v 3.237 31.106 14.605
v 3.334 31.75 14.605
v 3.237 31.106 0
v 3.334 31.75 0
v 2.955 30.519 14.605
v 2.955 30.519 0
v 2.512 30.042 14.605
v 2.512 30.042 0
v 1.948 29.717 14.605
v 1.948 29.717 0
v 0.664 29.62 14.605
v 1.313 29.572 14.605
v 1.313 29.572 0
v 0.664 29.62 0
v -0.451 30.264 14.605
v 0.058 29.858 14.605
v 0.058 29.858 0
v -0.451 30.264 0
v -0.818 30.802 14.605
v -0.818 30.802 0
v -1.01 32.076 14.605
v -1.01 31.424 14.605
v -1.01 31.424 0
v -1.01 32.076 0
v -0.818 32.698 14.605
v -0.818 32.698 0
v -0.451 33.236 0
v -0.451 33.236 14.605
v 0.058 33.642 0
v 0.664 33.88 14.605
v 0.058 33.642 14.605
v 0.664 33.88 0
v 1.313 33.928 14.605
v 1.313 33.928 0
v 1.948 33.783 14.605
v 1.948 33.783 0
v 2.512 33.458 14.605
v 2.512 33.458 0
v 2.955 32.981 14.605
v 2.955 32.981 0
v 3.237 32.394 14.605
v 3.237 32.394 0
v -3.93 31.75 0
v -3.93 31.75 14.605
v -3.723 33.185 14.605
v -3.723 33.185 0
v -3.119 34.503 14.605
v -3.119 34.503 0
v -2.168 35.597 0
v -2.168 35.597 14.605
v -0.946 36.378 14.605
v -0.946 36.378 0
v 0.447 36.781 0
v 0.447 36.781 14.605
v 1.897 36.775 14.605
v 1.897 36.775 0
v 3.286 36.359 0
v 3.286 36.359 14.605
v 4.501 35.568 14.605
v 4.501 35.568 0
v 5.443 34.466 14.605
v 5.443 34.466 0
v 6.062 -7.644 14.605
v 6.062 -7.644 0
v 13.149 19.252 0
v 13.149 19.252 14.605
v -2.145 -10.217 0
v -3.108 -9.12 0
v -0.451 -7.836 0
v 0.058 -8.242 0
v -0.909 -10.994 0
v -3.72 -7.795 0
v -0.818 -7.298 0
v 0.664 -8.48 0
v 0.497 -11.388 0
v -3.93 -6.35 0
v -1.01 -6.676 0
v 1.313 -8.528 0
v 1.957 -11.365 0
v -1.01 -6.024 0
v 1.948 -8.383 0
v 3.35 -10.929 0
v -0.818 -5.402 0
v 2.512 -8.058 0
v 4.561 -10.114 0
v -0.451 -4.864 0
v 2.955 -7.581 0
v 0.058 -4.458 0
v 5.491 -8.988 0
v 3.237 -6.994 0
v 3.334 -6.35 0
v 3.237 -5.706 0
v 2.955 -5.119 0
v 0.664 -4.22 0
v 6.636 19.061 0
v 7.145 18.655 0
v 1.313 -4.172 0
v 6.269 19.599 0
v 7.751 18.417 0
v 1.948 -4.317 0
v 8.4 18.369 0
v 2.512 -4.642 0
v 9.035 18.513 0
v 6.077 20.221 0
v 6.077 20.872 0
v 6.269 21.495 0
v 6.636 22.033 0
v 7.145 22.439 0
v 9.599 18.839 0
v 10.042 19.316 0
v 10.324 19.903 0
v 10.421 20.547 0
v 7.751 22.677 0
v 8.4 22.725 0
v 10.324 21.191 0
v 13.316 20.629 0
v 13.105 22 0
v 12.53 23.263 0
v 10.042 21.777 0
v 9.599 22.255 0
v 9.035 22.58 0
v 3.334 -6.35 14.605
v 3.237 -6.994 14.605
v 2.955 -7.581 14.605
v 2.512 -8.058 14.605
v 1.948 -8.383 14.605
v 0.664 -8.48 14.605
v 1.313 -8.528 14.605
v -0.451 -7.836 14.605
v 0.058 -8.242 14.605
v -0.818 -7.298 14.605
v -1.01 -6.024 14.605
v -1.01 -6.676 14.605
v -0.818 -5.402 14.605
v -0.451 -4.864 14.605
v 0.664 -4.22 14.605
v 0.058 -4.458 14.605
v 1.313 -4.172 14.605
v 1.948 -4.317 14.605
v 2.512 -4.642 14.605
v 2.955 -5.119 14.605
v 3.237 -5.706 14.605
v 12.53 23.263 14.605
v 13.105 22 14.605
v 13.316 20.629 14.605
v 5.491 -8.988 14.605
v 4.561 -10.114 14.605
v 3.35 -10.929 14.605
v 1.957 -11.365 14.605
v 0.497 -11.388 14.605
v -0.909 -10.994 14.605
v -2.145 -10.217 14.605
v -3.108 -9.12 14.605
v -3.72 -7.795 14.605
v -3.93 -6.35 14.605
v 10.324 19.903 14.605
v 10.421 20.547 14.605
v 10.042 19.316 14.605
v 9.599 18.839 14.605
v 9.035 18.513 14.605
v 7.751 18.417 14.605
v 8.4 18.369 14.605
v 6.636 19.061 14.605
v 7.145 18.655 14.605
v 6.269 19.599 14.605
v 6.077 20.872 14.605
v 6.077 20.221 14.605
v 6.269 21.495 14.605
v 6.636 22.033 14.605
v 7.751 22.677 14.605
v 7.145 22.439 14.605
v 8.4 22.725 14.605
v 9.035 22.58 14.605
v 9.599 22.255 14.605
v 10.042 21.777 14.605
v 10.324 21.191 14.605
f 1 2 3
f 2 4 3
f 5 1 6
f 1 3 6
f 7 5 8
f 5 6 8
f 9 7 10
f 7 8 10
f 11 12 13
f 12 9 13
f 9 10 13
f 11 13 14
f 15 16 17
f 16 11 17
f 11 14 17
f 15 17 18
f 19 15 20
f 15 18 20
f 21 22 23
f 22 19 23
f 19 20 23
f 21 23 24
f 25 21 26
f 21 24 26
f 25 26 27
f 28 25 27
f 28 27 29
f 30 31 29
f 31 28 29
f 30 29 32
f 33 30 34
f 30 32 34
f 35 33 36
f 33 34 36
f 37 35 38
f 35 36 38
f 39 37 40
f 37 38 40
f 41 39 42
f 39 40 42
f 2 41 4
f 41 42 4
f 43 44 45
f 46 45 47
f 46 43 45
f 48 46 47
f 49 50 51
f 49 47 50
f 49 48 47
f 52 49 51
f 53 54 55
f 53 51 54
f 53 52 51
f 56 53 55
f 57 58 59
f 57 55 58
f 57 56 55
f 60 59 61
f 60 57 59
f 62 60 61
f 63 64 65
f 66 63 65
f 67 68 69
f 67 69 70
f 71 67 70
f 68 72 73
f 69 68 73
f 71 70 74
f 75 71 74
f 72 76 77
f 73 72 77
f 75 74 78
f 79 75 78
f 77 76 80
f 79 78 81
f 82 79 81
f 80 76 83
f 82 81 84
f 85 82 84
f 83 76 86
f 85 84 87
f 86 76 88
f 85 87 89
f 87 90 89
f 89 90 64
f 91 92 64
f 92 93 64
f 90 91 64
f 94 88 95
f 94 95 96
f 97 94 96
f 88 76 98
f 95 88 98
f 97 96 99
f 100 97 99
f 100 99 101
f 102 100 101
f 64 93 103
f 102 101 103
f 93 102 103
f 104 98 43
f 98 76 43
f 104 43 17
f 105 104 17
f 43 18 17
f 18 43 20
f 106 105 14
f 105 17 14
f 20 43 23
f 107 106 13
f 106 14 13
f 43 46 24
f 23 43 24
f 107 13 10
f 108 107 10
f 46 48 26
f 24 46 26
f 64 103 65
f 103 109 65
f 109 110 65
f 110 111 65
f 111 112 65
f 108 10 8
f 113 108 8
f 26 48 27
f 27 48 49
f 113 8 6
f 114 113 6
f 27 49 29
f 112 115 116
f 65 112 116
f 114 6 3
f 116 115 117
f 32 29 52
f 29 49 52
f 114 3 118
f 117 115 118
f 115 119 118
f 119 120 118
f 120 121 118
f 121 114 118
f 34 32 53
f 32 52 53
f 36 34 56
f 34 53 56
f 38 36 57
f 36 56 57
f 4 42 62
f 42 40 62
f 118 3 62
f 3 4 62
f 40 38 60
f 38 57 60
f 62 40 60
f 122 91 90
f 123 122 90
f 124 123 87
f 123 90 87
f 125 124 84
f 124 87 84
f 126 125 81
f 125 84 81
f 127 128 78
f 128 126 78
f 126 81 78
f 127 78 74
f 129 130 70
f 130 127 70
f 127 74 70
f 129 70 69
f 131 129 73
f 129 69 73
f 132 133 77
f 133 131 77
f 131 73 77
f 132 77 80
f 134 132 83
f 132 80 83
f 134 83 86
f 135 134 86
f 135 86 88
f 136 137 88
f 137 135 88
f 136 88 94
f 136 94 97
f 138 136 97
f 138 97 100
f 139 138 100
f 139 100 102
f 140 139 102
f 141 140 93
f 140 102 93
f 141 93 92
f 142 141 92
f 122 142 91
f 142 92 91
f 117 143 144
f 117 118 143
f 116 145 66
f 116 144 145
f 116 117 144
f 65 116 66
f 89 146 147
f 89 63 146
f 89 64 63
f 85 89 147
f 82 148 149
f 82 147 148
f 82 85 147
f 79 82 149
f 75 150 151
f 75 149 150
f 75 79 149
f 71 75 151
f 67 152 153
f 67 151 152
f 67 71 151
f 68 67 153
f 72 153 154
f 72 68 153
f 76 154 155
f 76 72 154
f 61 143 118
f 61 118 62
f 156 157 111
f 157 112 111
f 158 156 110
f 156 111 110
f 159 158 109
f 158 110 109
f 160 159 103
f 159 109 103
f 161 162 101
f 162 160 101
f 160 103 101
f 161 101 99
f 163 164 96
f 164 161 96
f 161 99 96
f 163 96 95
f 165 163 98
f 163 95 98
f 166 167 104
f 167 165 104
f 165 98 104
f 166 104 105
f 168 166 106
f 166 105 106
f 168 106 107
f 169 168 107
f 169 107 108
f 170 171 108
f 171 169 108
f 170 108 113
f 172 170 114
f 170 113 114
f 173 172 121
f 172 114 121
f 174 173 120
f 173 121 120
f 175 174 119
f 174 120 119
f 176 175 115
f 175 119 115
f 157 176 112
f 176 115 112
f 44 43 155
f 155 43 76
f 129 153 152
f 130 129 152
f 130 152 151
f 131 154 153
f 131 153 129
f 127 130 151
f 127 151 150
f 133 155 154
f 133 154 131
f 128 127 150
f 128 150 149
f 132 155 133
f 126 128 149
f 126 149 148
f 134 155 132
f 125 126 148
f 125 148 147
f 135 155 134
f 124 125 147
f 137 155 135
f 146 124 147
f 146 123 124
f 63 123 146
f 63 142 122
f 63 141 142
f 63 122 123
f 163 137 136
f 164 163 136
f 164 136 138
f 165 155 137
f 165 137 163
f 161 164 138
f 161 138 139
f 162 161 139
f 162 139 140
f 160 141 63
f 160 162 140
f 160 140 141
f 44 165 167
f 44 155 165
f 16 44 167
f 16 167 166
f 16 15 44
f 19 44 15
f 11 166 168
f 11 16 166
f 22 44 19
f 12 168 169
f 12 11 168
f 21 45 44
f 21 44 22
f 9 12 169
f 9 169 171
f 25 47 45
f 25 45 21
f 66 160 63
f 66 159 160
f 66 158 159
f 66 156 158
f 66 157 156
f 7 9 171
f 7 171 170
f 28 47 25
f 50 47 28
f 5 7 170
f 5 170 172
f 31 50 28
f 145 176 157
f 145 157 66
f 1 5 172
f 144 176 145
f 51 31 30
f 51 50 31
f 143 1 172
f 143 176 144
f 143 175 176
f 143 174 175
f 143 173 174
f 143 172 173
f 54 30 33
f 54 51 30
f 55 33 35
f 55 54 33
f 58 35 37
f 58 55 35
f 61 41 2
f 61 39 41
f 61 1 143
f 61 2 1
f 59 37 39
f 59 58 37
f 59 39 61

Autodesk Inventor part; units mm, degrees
ref_plane "YZ Plane" through (0, 0, 0) normal (1, 0, 0) x (0, 1, 0)
ref_plane "XZ Plane" through (0, 0, 0) normal (0, 1, 0) x (-1, 0, 0)
ref_plane "XY Plane" through (0, 0, 0) normal (0, 0, 1) x (1, 0, 0)
sketch "Sketch1" plane through (0, 0, 0) normal (0, 0, 1) x (1, 0, 0)
  circle A0 centre (1.1498, 31.75) radius 2.1844 projected
  circle A1 centre (1.1498, -6.35) radius 2.1844 projected
  circle A2 centre (8.2369, 20.5469) radius 2.1844 projected
  arc A3 (-3.9302, -6.35) -> (6.0621, -7.6444) centre (1.1498, -6.35) ccw
  arc A4 (5.4429, 34.4658) -> (-3.9302, 31.75) centre (1.1498, 31.75) ccw
  arc A5 (13.1492, 19.2525) -> (12.53, 23.2627) centre (8.2369, 20.5469) ccw
  line L0 (6.0621, -7.6444) -> (13.1492, 19.2525)
  line L1 (12.53, 23.2627) -> (5.4429, 34.4658)
  line L2 (-3.9302, 31.75) -> (-3.9302, -6.35)
  point P0 (0, 0)
  dimension "d0" = 5.08
  dimension "d1" = 5.08
  dimension "d2" = 5.08
extrude "Extrusion1" add sketch "Sketch1" along normal blind 14.605
properties part number "RoundFix" material "Plastic, Opaque Black"
